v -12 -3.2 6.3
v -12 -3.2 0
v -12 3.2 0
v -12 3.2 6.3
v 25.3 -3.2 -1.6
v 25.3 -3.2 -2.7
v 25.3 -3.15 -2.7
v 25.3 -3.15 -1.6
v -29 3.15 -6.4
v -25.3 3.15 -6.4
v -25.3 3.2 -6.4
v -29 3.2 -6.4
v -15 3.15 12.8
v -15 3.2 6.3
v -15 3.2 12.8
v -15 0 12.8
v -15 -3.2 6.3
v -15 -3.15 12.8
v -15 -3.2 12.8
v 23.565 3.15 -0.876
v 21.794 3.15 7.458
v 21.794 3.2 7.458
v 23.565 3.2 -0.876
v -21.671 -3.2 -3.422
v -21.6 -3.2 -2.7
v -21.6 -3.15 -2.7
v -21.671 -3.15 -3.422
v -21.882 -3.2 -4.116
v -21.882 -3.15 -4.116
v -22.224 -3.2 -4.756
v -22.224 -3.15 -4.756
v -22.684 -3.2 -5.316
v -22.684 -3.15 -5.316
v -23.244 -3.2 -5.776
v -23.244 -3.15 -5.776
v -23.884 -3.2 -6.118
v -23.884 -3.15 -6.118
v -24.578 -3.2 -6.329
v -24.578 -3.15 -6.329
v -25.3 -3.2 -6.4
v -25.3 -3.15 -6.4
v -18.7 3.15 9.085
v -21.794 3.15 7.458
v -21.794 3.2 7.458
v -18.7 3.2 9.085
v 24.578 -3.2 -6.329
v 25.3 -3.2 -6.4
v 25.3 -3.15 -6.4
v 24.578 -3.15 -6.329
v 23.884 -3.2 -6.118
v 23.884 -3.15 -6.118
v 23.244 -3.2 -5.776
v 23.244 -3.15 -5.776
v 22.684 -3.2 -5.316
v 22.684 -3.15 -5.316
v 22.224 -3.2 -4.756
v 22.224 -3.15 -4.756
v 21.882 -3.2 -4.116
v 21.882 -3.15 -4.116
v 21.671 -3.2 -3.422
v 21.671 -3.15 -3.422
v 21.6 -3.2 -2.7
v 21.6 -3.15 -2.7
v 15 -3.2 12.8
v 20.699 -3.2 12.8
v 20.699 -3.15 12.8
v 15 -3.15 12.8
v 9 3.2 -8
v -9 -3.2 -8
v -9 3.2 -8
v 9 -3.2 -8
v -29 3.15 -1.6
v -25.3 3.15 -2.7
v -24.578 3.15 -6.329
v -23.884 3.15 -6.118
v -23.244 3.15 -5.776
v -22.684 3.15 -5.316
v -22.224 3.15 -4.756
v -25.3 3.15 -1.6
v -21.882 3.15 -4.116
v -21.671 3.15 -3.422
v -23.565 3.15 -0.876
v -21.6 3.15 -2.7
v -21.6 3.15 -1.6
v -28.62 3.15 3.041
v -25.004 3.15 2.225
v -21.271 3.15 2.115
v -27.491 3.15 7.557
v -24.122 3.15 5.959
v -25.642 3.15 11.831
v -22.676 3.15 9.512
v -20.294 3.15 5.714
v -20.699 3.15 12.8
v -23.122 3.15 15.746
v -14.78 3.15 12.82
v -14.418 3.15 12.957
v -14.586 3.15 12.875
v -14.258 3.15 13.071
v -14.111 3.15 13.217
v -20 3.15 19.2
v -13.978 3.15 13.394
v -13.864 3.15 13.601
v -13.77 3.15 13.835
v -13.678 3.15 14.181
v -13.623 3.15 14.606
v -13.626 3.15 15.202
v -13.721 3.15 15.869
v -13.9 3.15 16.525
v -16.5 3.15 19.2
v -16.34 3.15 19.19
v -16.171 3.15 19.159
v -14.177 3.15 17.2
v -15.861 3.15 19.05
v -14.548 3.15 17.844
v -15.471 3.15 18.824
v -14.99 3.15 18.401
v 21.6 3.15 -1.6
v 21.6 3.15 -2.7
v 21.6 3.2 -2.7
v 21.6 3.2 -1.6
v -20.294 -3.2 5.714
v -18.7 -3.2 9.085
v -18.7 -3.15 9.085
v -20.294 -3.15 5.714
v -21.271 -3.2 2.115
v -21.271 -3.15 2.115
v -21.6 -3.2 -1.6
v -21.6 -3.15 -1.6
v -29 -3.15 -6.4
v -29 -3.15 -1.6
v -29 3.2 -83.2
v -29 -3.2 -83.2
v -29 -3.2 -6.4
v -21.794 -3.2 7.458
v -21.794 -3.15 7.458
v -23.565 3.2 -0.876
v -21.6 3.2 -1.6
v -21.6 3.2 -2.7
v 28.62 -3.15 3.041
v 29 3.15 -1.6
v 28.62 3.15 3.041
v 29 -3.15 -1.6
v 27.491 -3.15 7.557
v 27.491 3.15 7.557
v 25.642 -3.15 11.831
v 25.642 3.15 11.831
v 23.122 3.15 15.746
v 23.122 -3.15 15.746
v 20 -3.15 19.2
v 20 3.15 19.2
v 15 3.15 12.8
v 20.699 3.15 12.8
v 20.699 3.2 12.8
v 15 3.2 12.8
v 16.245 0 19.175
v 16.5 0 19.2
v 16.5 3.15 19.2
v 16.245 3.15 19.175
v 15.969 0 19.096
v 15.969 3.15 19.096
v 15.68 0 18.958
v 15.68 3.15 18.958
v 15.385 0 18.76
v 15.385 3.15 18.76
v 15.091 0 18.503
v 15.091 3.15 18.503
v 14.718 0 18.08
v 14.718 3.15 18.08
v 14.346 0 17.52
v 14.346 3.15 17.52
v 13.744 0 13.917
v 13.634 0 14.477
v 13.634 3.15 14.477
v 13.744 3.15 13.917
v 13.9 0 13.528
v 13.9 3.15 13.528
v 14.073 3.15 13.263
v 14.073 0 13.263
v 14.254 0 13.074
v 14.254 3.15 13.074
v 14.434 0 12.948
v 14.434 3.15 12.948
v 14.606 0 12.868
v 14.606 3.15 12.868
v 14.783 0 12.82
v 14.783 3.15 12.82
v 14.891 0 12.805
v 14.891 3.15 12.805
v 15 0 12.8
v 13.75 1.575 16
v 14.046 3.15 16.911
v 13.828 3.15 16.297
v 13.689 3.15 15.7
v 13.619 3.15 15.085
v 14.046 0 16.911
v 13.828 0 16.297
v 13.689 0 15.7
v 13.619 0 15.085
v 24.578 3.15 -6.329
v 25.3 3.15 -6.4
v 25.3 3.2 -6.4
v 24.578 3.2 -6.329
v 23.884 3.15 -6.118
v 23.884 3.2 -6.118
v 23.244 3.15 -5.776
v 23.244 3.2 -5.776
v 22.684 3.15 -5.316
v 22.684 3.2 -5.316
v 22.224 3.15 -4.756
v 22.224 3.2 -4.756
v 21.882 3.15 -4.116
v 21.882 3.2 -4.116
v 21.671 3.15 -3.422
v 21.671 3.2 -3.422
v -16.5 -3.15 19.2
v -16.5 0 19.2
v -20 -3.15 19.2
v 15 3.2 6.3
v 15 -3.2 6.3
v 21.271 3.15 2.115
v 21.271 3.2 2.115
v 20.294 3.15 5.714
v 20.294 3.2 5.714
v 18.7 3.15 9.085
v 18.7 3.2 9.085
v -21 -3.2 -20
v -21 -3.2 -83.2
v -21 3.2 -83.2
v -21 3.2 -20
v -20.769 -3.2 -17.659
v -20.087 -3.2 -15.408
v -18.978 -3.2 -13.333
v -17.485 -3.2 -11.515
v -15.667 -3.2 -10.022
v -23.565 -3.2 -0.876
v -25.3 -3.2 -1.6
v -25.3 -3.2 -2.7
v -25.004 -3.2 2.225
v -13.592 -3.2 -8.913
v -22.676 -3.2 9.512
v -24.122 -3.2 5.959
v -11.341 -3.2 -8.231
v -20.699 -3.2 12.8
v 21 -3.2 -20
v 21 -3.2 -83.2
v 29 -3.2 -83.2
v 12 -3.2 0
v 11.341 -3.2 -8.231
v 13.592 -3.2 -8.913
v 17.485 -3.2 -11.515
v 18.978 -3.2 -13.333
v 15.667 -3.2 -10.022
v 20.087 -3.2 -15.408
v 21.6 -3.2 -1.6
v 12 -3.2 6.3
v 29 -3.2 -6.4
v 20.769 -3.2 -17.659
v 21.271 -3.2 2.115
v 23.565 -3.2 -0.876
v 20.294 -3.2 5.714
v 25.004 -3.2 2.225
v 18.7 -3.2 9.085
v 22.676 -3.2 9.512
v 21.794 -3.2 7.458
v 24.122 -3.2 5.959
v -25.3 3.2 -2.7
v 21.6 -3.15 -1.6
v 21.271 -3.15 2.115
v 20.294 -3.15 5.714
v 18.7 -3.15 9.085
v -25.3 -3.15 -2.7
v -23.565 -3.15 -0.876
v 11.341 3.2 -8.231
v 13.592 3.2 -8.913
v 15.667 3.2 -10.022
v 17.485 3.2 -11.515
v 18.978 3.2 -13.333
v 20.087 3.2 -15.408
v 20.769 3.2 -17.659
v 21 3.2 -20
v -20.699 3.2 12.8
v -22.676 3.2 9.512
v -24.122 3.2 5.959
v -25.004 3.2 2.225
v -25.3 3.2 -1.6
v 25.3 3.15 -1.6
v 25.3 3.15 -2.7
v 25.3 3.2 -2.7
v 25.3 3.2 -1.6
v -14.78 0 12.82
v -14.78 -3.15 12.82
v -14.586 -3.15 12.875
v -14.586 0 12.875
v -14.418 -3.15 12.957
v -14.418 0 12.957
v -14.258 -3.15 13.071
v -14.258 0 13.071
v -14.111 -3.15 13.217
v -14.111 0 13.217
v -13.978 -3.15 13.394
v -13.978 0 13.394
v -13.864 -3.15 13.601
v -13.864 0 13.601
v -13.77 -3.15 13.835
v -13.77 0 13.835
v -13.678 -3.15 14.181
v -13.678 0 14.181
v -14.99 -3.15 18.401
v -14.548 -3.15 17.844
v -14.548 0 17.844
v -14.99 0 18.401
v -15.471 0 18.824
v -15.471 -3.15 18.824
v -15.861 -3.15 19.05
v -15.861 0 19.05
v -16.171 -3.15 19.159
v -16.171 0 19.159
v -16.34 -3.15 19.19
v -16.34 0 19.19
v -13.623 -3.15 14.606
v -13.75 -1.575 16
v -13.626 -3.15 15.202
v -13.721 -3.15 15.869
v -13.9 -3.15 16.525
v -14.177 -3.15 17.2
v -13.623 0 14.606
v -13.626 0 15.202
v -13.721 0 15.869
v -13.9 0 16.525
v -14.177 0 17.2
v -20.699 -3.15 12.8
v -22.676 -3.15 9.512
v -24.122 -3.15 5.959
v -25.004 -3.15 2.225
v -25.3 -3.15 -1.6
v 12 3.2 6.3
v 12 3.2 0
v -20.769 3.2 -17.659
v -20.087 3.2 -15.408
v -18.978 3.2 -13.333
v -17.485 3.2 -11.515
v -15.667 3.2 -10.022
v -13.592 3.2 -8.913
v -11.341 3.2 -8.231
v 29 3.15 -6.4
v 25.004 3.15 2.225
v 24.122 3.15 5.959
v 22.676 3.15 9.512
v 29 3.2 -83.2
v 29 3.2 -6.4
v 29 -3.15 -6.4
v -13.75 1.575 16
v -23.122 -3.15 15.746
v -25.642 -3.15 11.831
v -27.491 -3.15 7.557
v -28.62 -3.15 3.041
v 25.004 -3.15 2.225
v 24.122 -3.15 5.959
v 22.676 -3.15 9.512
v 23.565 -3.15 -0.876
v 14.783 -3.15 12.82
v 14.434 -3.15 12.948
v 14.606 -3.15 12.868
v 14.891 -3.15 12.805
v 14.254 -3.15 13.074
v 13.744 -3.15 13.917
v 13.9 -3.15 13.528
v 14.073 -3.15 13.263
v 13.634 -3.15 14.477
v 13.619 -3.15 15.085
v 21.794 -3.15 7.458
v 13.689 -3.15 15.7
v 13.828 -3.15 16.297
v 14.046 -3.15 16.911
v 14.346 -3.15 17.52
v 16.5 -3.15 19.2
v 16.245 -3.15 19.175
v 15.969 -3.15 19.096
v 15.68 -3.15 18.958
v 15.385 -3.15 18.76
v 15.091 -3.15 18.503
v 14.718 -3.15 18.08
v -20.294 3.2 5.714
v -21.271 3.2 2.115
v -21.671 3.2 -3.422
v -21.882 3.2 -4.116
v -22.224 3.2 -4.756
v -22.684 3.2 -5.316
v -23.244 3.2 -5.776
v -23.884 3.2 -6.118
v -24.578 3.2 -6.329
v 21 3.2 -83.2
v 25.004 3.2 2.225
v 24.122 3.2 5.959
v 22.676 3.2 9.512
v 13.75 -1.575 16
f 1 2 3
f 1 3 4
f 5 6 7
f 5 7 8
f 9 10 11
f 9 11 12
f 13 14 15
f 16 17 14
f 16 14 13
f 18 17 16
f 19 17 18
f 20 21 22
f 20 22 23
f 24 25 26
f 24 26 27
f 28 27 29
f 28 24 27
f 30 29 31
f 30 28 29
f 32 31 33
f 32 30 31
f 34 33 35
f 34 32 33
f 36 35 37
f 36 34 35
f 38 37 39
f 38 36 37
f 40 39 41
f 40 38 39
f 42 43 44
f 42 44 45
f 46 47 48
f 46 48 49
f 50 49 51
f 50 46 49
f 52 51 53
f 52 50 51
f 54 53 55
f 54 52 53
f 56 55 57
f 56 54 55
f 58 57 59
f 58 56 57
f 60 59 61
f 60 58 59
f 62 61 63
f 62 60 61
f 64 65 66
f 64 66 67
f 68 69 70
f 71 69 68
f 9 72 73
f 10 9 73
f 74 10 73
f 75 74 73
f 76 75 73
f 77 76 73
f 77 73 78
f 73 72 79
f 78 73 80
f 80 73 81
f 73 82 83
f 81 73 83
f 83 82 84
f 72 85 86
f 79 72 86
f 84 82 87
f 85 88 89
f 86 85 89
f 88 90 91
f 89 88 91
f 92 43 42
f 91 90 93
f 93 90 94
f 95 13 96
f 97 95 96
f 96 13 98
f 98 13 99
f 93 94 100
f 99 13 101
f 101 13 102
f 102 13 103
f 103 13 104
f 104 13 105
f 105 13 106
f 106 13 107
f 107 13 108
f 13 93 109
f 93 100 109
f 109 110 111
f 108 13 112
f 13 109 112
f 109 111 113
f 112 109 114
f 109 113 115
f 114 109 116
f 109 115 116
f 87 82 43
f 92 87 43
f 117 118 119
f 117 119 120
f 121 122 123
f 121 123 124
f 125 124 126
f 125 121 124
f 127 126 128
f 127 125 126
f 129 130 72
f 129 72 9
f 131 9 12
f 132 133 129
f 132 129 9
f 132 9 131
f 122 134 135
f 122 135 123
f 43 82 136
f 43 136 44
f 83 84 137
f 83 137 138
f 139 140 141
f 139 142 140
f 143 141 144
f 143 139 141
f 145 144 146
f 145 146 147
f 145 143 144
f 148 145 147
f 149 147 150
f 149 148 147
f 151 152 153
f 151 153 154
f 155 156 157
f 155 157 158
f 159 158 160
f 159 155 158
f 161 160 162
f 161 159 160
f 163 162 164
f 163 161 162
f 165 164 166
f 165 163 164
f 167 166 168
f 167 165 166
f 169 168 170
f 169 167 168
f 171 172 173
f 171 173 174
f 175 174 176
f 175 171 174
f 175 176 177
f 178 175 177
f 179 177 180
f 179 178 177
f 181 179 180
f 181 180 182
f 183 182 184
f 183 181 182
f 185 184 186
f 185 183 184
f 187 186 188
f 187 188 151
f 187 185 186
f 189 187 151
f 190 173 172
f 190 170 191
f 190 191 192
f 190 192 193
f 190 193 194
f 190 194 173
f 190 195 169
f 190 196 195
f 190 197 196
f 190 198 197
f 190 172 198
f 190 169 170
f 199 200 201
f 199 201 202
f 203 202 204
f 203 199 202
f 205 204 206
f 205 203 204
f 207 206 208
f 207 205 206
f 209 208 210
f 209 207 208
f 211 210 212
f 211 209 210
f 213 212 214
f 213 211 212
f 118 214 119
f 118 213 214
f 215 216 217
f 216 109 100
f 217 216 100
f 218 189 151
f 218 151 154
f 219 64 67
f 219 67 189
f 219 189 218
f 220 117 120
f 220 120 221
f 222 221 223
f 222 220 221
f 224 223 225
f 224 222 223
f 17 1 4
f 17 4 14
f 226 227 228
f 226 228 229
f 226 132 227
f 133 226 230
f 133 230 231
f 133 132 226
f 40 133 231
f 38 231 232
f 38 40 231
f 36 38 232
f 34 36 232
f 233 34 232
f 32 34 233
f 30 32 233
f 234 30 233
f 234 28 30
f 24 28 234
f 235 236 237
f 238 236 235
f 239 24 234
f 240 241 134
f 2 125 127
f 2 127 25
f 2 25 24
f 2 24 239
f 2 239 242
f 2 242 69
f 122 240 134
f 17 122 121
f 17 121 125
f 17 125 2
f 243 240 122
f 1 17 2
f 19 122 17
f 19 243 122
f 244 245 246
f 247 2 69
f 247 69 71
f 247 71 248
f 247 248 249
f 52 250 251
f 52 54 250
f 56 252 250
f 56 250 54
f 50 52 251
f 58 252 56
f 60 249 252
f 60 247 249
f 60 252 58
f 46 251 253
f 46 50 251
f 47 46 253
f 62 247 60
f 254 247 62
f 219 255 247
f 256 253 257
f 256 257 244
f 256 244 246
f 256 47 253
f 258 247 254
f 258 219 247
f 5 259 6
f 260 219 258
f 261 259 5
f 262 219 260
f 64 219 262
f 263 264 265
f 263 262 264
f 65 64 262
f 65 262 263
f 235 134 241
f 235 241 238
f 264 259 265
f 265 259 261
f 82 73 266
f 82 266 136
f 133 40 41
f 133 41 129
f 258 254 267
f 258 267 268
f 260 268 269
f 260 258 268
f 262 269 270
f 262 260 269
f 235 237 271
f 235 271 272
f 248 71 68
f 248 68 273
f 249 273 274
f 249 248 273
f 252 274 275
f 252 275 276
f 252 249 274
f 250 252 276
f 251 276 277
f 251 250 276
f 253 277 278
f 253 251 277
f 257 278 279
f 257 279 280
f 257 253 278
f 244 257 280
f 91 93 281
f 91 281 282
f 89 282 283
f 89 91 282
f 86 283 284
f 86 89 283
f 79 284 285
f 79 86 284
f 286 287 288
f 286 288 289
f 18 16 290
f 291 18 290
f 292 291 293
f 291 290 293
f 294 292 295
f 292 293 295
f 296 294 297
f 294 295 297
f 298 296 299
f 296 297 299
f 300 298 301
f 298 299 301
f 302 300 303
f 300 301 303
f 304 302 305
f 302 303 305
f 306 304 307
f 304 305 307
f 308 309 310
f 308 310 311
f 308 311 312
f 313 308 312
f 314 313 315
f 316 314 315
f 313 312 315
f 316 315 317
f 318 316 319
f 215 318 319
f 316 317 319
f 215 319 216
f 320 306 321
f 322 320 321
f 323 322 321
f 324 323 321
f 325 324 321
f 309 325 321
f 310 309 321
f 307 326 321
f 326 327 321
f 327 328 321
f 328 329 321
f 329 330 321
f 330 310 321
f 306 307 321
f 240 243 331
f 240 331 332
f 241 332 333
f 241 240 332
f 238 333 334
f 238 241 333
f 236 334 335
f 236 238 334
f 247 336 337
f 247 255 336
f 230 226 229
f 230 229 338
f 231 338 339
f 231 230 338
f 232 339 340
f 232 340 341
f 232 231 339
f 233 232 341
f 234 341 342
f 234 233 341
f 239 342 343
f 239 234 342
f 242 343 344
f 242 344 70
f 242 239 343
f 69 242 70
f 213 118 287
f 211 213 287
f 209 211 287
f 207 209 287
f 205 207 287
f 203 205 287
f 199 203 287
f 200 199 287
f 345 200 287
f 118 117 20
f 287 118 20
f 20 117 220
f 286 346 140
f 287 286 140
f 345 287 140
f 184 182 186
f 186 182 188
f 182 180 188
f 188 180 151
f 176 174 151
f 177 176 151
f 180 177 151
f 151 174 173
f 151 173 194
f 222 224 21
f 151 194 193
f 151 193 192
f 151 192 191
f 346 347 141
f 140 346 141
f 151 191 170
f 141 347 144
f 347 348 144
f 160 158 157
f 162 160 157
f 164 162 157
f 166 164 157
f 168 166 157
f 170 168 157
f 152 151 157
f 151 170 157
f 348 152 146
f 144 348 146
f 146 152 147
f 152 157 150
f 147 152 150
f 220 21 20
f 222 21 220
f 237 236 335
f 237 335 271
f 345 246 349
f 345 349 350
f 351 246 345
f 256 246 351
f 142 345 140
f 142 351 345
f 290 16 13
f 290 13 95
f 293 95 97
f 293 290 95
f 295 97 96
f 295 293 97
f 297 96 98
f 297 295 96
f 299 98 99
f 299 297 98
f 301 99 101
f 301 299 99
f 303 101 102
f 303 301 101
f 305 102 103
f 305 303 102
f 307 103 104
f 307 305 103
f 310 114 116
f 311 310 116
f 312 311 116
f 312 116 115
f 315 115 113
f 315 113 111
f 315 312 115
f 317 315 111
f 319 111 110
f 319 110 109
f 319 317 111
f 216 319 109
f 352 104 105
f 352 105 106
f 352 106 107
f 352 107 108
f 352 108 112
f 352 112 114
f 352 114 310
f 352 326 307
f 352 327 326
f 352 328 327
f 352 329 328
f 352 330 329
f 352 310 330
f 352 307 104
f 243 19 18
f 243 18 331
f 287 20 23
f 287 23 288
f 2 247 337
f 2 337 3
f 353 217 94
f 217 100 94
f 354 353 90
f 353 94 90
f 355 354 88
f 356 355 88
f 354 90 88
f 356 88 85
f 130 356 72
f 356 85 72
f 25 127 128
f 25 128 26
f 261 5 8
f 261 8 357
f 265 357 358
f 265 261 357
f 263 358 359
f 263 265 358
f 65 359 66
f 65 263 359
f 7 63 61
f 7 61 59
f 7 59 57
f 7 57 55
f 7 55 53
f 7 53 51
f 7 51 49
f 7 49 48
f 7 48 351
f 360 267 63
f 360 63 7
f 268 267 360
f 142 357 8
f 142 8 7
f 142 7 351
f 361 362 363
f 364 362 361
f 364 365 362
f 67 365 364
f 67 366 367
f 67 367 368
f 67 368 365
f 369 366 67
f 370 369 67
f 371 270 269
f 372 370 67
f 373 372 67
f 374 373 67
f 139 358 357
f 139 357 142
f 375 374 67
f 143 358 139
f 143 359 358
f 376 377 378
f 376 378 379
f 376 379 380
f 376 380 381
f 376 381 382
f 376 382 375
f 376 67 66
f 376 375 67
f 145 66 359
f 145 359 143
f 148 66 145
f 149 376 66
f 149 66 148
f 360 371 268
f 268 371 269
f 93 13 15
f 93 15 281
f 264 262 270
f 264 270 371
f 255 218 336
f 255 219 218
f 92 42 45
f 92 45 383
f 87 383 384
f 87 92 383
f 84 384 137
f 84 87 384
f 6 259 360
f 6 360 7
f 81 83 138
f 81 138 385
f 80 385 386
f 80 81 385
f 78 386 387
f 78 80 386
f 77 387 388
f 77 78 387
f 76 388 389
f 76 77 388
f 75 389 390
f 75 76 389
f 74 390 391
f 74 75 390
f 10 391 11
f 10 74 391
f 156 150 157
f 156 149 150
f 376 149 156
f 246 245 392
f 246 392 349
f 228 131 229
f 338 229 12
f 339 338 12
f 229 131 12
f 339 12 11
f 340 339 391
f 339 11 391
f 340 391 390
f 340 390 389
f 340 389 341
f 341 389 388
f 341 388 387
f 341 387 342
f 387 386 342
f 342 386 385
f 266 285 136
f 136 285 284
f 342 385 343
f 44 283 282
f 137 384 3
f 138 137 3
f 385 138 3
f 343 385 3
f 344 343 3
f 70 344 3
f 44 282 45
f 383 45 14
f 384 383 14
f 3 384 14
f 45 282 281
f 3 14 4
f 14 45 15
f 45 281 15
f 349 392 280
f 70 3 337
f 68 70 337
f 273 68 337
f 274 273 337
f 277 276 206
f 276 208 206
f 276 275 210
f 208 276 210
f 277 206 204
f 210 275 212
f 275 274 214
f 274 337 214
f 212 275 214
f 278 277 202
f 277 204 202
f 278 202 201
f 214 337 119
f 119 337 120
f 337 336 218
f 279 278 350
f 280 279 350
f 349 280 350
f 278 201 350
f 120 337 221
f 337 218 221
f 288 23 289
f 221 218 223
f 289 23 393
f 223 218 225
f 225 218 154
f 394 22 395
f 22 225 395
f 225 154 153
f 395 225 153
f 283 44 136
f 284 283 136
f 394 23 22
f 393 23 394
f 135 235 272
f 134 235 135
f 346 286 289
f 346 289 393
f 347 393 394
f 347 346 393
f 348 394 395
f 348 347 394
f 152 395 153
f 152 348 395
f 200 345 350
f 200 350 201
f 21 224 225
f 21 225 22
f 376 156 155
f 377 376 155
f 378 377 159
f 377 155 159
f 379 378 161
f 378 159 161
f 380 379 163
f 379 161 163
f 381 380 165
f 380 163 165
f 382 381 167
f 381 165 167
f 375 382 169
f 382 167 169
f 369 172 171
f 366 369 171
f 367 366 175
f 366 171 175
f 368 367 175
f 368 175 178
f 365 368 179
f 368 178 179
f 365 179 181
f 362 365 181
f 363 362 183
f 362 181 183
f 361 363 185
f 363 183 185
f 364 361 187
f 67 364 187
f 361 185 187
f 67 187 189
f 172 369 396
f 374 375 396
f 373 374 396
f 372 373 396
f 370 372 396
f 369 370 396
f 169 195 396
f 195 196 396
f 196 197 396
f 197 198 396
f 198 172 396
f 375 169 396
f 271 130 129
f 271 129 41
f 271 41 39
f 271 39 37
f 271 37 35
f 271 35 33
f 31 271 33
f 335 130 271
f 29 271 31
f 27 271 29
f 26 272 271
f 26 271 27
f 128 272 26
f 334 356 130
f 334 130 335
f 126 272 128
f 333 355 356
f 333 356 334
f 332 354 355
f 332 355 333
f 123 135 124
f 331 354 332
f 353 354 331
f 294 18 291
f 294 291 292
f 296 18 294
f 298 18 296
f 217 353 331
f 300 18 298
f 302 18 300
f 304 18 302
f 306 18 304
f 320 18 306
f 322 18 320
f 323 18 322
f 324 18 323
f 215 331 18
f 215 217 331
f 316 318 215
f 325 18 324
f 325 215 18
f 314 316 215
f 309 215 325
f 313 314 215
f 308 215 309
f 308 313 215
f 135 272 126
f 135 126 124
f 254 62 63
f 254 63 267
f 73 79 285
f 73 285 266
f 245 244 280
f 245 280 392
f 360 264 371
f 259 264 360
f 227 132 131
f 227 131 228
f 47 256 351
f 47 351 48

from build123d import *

# Parameters (mm, degrees)
F2_DEPTH = 3.2
F3_DEPTH = 3.15


with BuildPart() as f2:
    # F1 (on Front) → F2 (new body, symmetric)
    with BuildSketch(Plane.XZ):
        with BuildLine():
            Line((12, 6.3), (12, 0))
            Line((12, 0), (-12, 0))
            Line((-12, 0), (-12, 6.3))
            Line((-12, 6.3), (-15, 6.3))
            Line((-15, 6.3), (-15, 12.8))
            Line((-15, 12.8), (-20.6991873327, 12.8))
            ThreePointArc((-20.6991873327, 12.8), (-24.1218523847, 5.9585626477), (-25.3, -1.6))
            Line((-25.3, -1.6), (-25.3, -2.7))
            Line((-25.3, -2.7), (-23.56463857, -0.8764211088))
            Line((-23.56463857, -0.8764211088), (-21.7944681644, 7.4581257068))
            Line((-21.7944681644, 7.4581257068), (-18.7, 9.085327427))
            ThreePointArc((-18.7, 9.085327427), (-20.8621196327, 3.9359331242), (-21.6, -1.6))
            Line((-21.6, -1.6), (-21.6, -2.7))
            ThreePointArc((-21.6, -2.7), (-22.6837049096, -5.3162950904), (-25.3, -6.4))
            Line((-25.3, -6.4), (-29, -6.4))
            Line((-29, -6.4), (-29, -83.2))
            Line((-29, -83.2), (-21, -83.2))
            Line((-21, -83.2), (-21, -20))
            ThreePointArc((-21, -20), (-17.4852813742, -11.5147186258), (-9, -8))
            Line((-9, -8), (9, -8))
            ThreePointArc((9, -8), (17.4852813742, -11.5147186258), (21, -20))
            Line((21, -20), (21, -83.2))
            Line((21, -83.2), (29, -83.2))
            Line((29, -83.2), (29, -6.4))
            Line((29, -6.4), (25.3, -6.4))
            ThreePointArc((25.3, -6.4), (22.6837049096, -5.3162950904), (21.6, -2.7))
            Line((21.6, -2.7), (21.6, -1.6))
            ThreePointArc((21.6, -1.6), (20.8621196327, 3.9359331242), (18.7, 9.085327427))
            Line((18.7, 9.085327427), (21.7944681644, 7.4581257068))
            Line((21.7944681644, 7.4581257068), (23.56463857, -0.8764211088))
            Line((23.56463857, -0.8764211088), (25.3, -2.7))
            Line((25.3, -2.7), (25.3, -1.6))
            ThreePointArc((25.3, -1.6), (24.1218523847, 5.9585626477), (20.6991873327, 12.8))
            Line((20.6991873327, 12.8), (15, 12.8))
            Line((15, 12.8), (15, 6.3))
            Line((15, 6.3), (12, 6.3))
        make_face()
    extrude(amount=F2_DEPTH, both=True)

    # F1 (on Front) → F3 (join, symmetric)
    with BuildSketch(Plane.XZ):
        with BuildLine():
            Line((-20.6991873327, 12.8), (-15, 12.8))
            add(Edge.make_bspline(
                [(-14.9999999623, 12.8), (-13, 12.8), (-13.7499999859, 15.9999999397), (-14.4999999717, 19.1999998793), (-16.4999999623, 19.2)],
                knots=[6.0755071162, 6.0755071162, 6.0755071162, 7.6463034241, 7.6463034241, 9.217099732, 9.217099732, 9.217099732], degree=2, weights=[1, 0.7071067879, 1, 0.7071067879, 1]))
            Line((-16.5, 19.2), (-20, 19.2))
            ThreePointArc((-20, 19.2), (-26.653524819, 9.7318136236), (-29, -1.6))
            Line((-29, -1.6), (-29, -6.4))
            Line((-29, -6.4), (-25.3, -6.4))
            ThreePointArc((-25.3, -6.4), (-22.6837049096, -5.3162950904), (-21.6, -2.7))
            Line((-21.6, -2.7), (-21.6, -1.6))
            ThreePointArc((-21.6, -1.6), (-20.8621196327, 3.9359331242), (-18.7, 9.085327427))
            Line((-18.7, 9.085327427), (-21.7944681644, 7.4581257068))
            Line((-21.7944681644, 7.4581257068), (-23.56463857, -0.8764211088))
            Line((-23.56463857, -0.8764211088), (-25.3, -2.7))
            Line((-25.3, -2.7), (-25.3, -1.6))
            ThreePointArc((-25.3, -1.6), (-24.1218523847, 5.9585626477), (-20.6991873327, 12.8))
        make_face()
        with BuildLine():
            add(Edge.make_bspline(
                [(16.5, 19.2), (14.5000000377, 19.2), (13.7500000377, 16), (13.0000000377, 12.8), (15, 12.8)],
                knots=[0.2076781757, 0.2076781757, 0.2076781757, 1.7784745025, 1.7784745025, 3.3492708293, 3.3492708293, 3.3492708293], degree=2, weights=[1, 0.7071067812, 1, 0.7071067812, 1]))
            Line((15, 12.8), (20.6991873327, 12.8))
            ThreePointArc((20.6991873327, 12.8), (24.1218523847, 5.9585626477), (25.3, -1.6))
            Line((25.3, -1.6), (25.3, -2.7))
            Line((25.3, -2.7), (23.56463857, -0.8764211088))
            Line((23.56463857, -0.8764211088), (21.7944681644, 7.4581257068))
            Line((21.7944681644, 7.4581257068), (18.7, 9.085327427))
            ThreePointArc((18.7, 9.085327427), (20.8621196327, 3.9359331242), (21.6, -1.6))
            Line((21.6, -1.6), (21.6, -2.7))
            ThreePointArc((21.6, -2.7), (22.6837049096, -5.3162950904), (25.3, -6.4))
            Line((25.3, -6.4), (29, -6.4))
            Line((29, -6.4), (29, -1.6))
            ThreePointArc((29, -1.6), (26.653524819, 9.7318136236), (20, 19.2))
            Line((20, 19.2), (16.5, 19.2))
        make_face()
    extrude(amount=F3_DEPTH, both=True)


solid = f2.part
